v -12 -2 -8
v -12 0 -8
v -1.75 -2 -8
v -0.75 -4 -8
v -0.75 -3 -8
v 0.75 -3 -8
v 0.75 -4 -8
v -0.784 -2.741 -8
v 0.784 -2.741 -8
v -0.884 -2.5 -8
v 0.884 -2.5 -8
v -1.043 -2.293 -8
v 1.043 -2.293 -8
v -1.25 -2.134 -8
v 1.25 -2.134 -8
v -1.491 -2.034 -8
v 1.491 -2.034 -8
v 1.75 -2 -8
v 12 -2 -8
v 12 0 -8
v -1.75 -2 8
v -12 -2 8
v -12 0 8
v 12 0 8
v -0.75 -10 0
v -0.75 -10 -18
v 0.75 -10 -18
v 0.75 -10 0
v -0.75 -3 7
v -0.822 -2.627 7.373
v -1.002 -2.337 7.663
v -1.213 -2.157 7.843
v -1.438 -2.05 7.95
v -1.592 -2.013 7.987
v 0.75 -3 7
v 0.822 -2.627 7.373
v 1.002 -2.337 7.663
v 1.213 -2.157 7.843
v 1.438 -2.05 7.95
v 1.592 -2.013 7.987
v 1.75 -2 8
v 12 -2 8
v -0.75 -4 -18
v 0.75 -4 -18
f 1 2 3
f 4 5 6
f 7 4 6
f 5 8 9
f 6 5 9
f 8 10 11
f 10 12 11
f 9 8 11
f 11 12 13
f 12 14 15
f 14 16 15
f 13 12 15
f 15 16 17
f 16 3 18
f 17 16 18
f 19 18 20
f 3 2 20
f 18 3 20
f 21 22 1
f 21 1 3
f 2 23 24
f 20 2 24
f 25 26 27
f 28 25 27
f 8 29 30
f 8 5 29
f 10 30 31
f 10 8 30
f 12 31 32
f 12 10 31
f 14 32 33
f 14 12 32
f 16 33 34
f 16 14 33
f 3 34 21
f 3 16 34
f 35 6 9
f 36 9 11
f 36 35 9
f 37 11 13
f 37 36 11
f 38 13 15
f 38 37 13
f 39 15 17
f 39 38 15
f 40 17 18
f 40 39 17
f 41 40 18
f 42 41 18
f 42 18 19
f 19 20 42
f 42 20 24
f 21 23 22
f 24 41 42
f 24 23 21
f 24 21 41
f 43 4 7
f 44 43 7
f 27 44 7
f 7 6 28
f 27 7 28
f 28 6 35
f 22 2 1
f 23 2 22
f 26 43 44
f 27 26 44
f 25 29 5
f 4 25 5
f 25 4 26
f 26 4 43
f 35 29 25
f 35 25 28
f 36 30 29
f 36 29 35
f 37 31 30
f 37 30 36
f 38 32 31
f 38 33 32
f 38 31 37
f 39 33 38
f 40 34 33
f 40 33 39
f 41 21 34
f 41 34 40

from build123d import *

# Parameters (mm, degrees)
F0_W     = 24
F0_H     = 16
F1_DEPTH = 2
F2_W     = 1.5
F2_H     = 16
F2_H_2   = 10
F3_DEPTH = 8
F4_DEPTH = 2
F5_SIZE  = 8
F6_R     = 1


with BuildPart() as f1:
    # F0 (on Front) → F1 (new body)
    with BuildSketch(Plane.XZ):
        Rectangle(F0_W, F0_H)
    extrude(amount=F1_DEPTH)

    # F2 (on face) → F3 (join)
    with BuildSketch(Plane.XZ.offset(2)):
        Rectangle(F2_W, F2_H)
        with Locations((0, -13)):
            Rectangle(F2_W, F2_H_2)
    extrude(amount=F3_DEPTH)

    # F4 (cut): a face of the model
    f4_faces = [f1.faces().sort_by_distance(p)[0] for p in [
        (0, -2, -13),
    ]]
    extrude(f4_faces, amount=-F4_DEPTH, mode=Mode.SUBTRACT)

    # F5
    f5_edges = [f1.edges().sort_by_distance(p)[0] for p in [
        (0, -10, 8),
    ]]
    chamfer(f5_edges, length=F5_SIZE)

    # F6
    f6_edges = [f1.edges().sort_by_distance(p)[0] for p in [
        (-0.75, -2, 0),
        (0.75, -2, 0),
    ]]
    fillet(f6_edges, radius=F6_R)


solid = f1.part
